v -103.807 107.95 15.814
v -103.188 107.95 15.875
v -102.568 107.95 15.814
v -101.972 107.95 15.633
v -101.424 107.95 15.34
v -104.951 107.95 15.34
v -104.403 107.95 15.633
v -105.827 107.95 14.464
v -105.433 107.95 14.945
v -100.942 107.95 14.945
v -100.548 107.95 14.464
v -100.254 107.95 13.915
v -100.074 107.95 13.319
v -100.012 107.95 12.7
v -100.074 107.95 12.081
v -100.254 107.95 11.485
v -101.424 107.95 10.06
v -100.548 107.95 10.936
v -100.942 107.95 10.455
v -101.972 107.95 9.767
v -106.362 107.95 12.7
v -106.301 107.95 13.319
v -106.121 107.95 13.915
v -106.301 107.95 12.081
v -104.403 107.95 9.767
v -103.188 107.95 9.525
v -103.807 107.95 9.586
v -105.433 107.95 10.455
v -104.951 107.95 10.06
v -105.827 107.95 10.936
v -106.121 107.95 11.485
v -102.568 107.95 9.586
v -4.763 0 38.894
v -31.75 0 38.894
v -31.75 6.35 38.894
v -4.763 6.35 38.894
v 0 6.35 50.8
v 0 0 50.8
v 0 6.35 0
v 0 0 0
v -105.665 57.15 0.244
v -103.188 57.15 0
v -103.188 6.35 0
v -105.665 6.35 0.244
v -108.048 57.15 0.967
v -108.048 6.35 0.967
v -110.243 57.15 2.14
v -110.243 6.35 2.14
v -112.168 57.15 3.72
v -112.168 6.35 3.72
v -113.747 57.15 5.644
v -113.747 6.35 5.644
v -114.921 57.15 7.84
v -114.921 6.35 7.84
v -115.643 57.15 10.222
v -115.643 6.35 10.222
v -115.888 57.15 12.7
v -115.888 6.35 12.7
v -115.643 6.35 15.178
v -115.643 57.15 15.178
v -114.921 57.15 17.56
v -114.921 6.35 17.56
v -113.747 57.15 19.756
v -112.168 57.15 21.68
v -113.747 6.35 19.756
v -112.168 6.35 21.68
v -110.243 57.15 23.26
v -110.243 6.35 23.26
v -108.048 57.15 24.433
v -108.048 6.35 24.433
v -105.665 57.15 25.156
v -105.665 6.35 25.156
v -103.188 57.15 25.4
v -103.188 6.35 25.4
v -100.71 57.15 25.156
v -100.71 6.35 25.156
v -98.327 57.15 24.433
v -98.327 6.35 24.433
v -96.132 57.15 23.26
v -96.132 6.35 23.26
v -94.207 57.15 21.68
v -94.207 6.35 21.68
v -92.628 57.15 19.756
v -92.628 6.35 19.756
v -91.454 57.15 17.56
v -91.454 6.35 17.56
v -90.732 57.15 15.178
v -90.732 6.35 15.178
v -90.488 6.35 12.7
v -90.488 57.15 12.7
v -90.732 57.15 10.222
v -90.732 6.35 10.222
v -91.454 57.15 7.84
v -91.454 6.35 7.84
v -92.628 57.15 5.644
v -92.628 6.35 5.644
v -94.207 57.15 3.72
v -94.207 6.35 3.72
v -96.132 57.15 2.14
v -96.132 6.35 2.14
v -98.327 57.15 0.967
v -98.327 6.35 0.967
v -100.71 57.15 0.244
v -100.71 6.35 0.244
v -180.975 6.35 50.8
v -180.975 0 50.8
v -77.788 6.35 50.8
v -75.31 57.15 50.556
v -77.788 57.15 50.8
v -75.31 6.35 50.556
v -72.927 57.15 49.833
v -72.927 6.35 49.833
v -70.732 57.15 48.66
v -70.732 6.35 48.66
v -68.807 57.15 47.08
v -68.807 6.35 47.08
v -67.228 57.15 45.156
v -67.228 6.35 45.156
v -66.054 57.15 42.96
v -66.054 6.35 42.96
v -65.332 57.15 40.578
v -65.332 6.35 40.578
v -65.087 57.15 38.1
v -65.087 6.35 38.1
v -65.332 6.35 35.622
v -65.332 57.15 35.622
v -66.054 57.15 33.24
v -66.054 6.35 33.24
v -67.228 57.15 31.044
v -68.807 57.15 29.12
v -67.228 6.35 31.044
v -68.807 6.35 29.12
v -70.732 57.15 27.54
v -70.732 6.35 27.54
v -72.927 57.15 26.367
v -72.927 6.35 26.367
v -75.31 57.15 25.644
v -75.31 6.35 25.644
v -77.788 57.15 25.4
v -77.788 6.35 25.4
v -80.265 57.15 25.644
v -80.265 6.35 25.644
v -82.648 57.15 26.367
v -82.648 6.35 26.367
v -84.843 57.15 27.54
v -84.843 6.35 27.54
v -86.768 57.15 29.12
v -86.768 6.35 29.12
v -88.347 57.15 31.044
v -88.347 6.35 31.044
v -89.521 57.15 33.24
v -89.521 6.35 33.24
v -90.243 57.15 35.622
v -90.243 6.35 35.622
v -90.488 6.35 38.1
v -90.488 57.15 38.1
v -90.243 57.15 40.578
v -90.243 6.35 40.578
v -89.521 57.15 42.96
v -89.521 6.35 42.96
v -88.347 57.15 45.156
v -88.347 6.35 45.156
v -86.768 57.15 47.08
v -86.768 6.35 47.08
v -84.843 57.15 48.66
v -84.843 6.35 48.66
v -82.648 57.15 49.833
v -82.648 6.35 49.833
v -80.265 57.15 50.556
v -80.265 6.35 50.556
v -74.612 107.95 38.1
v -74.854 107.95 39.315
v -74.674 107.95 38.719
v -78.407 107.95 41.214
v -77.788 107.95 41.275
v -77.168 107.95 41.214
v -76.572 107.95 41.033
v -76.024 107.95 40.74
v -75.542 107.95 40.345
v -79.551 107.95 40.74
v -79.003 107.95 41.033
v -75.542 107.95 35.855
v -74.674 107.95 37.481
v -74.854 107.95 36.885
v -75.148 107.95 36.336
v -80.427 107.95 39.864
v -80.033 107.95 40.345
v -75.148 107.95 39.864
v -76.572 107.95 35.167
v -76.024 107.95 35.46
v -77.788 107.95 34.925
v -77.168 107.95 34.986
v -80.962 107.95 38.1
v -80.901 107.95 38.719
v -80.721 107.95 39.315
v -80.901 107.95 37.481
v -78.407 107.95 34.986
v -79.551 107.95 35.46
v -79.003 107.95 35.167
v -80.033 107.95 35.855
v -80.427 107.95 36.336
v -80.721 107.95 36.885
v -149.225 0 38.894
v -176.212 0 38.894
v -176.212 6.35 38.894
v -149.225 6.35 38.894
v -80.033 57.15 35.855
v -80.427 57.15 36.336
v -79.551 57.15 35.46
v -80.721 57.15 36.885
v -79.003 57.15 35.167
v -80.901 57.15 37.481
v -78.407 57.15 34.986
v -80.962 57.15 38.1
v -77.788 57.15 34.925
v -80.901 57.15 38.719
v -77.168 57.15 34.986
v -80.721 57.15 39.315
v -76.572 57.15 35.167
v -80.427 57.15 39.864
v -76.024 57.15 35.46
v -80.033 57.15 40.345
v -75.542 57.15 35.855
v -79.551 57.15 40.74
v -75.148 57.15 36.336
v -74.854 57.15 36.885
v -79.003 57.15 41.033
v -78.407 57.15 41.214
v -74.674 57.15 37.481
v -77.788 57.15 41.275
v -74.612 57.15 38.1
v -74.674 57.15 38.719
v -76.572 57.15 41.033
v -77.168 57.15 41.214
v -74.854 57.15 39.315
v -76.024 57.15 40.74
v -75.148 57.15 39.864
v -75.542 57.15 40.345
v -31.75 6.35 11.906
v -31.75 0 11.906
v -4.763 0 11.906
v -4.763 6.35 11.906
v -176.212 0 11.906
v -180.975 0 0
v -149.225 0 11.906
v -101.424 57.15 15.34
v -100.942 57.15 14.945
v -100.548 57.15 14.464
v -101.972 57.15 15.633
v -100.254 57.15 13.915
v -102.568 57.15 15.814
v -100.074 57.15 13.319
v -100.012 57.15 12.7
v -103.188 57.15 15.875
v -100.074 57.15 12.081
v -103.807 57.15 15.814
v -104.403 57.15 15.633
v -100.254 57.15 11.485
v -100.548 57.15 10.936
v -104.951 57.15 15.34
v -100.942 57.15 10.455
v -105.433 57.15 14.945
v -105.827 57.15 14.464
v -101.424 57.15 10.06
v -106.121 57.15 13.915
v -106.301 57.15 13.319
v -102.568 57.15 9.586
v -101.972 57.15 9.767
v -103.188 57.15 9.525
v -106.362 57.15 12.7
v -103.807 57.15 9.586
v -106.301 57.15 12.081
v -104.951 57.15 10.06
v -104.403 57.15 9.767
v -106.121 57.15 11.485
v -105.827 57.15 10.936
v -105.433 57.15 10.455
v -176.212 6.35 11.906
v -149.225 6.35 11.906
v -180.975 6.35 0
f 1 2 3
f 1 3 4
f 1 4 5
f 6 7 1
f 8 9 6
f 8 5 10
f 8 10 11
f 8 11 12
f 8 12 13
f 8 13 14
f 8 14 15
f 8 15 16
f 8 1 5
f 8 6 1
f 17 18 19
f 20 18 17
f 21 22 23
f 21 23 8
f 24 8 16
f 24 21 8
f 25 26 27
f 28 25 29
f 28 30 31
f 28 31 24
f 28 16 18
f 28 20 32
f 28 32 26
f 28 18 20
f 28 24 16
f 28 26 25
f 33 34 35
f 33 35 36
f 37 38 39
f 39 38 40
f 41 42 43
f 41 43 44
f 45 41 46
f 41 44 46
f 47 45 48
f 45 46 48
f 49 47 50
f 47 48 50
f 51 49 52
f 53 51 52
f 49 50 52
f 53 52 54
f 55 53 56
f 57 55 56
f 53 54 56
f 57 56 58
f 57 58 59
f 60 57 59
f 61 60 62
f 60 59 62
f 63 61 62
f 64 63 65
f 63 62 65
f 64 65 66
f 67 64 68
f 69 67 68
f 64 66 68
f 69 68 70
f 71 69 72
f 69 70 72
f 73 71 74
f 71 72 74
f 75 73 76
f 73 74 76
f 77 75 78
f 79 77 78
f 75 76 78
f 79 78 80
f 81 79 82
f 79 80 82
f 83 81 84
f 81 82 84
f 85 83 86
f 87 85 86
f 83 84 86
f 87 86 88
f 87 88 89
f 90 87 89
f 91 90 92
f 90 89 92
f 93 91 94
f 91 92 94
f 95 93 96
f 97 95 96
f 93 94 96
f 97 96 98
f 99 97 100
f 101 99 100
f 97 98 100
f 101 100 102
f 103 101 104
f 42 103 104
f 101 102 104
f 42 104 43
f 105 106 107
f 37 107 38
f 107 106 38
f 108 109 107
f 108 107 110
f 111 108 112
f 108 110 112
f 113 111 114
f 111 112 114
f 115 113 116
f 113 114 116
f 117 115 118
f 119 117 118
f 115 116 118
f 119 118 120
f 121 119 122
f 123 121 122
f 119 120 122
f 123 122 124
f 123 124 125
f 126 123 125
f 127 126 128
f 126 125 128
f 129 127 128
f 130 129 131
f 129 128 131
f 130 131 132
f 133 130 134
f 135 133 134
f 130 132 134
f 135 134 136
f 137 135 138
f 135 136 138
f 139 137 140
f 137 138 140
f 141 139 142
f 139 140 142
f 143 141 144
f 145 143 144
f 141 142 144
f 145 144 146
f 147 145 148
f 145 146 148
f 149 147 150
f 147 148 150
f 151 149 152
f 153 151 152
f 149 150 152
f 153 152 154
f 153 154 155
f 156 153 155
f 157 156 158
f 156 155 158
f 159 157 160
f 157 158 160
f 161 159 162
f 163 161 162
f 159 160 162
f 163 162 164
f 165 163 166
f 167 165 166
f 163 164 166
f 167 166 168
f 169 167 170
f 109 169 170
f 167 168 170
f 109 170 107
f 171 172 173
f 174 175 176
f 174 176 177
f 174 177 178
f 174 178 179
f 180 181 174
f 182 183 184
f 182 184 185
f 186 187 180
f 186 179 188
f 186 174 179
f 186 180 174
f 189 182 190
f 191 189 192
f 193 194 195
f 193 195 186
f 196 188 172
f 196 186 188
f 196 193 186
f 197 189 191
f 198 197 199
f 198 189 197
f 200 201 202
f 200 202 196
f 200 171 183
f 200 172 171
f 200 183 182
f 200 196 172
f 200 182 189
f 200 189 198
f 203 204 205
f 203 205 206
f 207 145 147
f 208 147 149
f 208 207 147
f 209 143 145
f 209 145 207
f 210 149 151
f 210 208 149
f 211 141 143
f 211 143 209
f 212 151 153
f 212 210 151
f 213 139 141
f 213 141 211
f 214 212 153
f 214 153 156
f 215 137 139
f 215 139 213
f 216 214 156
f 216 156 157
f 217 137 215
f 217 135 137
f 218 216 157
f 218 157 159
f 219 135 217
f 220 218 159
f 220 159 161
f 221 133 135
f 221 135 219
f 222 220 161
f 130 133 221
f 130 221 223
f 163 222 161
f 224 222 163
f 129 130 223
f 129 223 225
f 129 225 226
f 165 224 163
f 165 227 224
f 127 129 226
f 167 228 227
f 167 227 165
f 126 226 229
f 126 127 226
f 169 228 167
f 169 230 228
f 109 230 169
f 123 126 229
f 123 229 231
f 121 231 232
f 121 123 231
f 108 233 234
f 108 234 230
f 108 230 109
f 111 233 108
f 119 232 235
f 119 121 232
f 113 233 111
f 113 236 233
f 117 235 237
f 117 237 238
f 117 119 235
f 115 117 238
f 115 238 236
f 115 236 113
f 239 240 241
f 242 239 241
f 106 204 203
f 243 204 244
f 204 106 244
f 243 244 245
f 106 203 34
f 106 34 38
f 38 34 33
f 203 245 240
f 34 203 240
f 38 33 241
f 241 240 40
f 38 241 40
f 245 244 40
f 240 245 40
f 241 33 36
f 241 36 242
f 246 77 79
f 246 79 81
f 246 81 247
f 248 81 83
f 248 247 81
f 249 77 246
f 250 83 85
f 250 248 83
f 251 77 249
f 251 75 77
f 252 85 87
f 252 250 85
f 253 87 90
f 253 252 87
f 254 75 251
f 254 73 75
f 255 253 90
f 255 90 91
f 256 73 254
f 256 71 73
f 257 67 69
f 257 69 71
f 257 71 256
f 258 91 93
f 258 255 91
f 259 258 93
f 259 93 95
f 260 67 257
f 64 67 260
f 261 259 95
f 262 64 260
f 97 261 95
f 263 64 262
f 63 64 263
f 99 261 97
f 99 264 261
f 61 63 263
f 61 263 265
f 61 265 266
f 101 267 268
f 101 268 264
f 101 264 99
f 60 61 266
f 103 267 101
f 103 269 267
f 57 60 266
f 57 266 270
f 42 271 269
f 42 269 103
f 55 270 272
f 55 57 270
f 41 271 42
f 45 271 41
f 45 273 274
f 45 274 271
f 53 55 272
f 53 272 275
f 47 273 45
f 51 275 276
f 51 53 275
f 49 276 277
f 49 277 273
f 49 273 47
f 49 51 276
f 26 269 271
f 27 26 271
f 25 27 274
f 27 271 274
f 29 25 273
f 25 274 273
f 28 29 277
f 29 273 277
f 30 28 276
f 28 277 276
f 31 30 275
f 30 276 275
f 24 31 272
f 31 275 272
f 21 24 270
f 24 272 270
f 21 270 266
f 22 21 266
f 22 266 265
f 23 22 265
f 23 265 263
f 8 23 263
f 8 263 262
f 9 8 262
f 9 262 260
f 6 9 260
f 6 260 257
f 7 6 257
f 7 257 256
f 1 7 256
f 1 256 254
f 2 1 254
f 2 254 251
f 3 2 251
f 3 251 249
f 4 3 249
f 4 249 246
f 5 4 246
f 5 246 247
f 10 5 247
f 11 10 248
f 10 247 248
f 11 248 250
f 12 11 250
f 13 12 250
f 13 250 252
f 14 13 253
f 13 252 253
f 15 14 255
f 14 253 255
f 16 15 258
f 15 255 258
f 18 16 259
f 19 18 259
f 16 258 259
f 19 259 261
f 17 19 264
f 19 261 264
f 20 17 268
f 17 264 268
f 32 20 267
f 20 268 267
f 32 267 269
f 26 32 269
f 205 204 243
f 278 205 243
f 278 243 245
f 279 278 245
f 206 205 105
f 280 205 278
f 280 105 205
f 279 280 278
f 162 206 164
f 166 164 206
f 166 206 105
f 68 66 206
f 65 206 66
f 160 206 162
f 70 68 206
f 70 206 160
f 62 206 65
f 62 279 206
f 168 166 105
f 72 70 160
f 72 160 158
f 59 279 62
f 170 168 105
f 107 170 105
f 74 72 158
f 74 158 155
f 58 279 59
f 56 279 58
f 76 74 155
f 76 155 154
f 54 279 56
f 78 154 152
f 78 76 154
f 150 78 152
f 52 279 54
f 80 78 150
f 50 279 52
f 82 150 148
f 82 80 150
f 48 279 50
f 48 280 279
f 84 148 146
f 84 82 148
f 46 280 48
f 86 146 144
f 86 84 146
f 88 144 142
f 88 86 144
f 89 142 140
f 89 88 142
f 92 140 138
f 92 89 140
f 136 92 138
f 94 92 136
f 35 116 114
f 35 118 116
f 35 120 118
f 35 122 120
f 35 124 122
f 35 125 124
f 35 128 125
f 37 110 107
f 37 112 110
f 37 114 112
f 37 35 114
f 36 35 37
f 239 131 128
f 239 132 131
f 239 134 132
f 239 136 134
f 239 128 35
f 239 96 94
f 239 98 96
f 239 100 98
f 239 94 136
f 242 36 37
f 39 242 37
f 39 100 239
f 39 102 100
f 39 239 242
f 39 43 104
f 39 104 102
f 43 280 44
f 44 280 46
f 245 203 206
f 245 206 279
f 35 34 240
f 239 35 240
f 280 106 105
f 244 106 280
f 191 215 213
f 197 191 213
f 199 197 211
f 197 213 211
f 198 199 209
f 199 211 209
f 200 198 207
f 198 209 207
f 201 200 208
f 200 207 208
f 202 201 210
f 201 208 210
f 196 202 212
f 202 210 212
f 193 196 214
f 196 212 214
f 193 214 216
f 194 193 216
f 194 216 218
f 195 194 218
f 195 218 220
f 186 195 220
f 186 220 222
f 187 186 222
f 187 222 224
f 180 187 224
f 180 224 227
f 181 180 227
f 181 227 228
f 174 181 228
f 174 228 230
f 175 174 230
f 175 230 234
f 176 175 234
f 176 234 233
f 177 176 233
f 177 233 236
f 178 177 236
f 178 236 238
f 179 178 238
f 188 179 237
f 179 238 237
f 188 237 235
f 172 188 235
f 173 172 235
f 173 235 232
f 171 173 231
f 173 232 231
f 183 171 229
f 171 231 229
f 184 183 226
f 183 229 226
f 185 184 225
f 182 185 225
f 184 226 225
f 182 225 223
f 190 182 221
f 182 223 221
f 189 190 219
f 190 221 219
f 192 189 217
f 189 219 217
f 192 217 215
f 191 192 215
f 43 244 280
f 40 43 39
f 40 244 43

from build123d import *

# Parameters (mm, degrees)
SKETCH1_W           = 180.975
SKETCH1_H           = 50.8
SKETCH1_W_2         = 26.9875
SKETCH1_H_2         = 26.9875
BOSS_EXTRUDE1_DEPTH = 6.35
SKETCH3_R           = 3.175
BOSS_EXTRUDE2_DEPTH = 101.6
SKETCH4_R           = 12.7
BOSS_EXTRUDE3_DEPTH = 50.8


with BuildPart() as part:
    # Sketch1 → Boss-Extrude1 (new body)
    with BuildSketch(Plane(origin=(0, 0, 0), x_dir=(1, 0, 0), z_dir=(0, 1, 0))):
        with Locations((-90.4875, -25.4)):
            Rectangle(SKETCH1_W, SKETCH1_H)
        with Locations((-162.71875, -25.4)):
            Rectangle(SKETCH1_W_2, SKETCH1_H_2, mode=Mode.SUBTRACT)
        with Locations((-18.25625, -25.4)):
            Rectangle(SKETCH1_W_2, SKETCH1_H_2, mode=Mode.SUBTRACT)
    extrude(amount=BOSS_EXTRUDE1_DEPTH)

    # Sketch3 → Boss-Extrude2 (add)
    with BuildSketch(Plane(origin=(0, 6.35, 0), x_dir=(1, 0, 0), z_dir=(0, 1, 0))):
        with Locations(Location((-77.7875, -38.1, 0), (0, 0, 90))):
            Circle(SKETCH3_R)
        with Locations(Location((-103.1875, -12.7, 0), (0, 0, 90))):
            Circle(SKETCH3_R)
    extrude(amount=BOSS_EXTRUDE2_DEPTH)

    # Sketch4 → Boss-Extrude3 (add)
    with BuildSketch(Plane(origin=(0, 6.35, 0), x_dir=(1, 0, 0), z_dir=(0, 1, 0))):
        with Locations(Location((-103.1875, -12.7, 0), (0, 0, 90))):
            Circle(SKETCH4_R)
        with Locations(Location((-77.7875, -38.1, 0), (0, 0, 270))):
            Circle(SKETCH4_R)
    extrude(amount=BOSS_EXTRUDE3_DEPTH)


solid = part.part
